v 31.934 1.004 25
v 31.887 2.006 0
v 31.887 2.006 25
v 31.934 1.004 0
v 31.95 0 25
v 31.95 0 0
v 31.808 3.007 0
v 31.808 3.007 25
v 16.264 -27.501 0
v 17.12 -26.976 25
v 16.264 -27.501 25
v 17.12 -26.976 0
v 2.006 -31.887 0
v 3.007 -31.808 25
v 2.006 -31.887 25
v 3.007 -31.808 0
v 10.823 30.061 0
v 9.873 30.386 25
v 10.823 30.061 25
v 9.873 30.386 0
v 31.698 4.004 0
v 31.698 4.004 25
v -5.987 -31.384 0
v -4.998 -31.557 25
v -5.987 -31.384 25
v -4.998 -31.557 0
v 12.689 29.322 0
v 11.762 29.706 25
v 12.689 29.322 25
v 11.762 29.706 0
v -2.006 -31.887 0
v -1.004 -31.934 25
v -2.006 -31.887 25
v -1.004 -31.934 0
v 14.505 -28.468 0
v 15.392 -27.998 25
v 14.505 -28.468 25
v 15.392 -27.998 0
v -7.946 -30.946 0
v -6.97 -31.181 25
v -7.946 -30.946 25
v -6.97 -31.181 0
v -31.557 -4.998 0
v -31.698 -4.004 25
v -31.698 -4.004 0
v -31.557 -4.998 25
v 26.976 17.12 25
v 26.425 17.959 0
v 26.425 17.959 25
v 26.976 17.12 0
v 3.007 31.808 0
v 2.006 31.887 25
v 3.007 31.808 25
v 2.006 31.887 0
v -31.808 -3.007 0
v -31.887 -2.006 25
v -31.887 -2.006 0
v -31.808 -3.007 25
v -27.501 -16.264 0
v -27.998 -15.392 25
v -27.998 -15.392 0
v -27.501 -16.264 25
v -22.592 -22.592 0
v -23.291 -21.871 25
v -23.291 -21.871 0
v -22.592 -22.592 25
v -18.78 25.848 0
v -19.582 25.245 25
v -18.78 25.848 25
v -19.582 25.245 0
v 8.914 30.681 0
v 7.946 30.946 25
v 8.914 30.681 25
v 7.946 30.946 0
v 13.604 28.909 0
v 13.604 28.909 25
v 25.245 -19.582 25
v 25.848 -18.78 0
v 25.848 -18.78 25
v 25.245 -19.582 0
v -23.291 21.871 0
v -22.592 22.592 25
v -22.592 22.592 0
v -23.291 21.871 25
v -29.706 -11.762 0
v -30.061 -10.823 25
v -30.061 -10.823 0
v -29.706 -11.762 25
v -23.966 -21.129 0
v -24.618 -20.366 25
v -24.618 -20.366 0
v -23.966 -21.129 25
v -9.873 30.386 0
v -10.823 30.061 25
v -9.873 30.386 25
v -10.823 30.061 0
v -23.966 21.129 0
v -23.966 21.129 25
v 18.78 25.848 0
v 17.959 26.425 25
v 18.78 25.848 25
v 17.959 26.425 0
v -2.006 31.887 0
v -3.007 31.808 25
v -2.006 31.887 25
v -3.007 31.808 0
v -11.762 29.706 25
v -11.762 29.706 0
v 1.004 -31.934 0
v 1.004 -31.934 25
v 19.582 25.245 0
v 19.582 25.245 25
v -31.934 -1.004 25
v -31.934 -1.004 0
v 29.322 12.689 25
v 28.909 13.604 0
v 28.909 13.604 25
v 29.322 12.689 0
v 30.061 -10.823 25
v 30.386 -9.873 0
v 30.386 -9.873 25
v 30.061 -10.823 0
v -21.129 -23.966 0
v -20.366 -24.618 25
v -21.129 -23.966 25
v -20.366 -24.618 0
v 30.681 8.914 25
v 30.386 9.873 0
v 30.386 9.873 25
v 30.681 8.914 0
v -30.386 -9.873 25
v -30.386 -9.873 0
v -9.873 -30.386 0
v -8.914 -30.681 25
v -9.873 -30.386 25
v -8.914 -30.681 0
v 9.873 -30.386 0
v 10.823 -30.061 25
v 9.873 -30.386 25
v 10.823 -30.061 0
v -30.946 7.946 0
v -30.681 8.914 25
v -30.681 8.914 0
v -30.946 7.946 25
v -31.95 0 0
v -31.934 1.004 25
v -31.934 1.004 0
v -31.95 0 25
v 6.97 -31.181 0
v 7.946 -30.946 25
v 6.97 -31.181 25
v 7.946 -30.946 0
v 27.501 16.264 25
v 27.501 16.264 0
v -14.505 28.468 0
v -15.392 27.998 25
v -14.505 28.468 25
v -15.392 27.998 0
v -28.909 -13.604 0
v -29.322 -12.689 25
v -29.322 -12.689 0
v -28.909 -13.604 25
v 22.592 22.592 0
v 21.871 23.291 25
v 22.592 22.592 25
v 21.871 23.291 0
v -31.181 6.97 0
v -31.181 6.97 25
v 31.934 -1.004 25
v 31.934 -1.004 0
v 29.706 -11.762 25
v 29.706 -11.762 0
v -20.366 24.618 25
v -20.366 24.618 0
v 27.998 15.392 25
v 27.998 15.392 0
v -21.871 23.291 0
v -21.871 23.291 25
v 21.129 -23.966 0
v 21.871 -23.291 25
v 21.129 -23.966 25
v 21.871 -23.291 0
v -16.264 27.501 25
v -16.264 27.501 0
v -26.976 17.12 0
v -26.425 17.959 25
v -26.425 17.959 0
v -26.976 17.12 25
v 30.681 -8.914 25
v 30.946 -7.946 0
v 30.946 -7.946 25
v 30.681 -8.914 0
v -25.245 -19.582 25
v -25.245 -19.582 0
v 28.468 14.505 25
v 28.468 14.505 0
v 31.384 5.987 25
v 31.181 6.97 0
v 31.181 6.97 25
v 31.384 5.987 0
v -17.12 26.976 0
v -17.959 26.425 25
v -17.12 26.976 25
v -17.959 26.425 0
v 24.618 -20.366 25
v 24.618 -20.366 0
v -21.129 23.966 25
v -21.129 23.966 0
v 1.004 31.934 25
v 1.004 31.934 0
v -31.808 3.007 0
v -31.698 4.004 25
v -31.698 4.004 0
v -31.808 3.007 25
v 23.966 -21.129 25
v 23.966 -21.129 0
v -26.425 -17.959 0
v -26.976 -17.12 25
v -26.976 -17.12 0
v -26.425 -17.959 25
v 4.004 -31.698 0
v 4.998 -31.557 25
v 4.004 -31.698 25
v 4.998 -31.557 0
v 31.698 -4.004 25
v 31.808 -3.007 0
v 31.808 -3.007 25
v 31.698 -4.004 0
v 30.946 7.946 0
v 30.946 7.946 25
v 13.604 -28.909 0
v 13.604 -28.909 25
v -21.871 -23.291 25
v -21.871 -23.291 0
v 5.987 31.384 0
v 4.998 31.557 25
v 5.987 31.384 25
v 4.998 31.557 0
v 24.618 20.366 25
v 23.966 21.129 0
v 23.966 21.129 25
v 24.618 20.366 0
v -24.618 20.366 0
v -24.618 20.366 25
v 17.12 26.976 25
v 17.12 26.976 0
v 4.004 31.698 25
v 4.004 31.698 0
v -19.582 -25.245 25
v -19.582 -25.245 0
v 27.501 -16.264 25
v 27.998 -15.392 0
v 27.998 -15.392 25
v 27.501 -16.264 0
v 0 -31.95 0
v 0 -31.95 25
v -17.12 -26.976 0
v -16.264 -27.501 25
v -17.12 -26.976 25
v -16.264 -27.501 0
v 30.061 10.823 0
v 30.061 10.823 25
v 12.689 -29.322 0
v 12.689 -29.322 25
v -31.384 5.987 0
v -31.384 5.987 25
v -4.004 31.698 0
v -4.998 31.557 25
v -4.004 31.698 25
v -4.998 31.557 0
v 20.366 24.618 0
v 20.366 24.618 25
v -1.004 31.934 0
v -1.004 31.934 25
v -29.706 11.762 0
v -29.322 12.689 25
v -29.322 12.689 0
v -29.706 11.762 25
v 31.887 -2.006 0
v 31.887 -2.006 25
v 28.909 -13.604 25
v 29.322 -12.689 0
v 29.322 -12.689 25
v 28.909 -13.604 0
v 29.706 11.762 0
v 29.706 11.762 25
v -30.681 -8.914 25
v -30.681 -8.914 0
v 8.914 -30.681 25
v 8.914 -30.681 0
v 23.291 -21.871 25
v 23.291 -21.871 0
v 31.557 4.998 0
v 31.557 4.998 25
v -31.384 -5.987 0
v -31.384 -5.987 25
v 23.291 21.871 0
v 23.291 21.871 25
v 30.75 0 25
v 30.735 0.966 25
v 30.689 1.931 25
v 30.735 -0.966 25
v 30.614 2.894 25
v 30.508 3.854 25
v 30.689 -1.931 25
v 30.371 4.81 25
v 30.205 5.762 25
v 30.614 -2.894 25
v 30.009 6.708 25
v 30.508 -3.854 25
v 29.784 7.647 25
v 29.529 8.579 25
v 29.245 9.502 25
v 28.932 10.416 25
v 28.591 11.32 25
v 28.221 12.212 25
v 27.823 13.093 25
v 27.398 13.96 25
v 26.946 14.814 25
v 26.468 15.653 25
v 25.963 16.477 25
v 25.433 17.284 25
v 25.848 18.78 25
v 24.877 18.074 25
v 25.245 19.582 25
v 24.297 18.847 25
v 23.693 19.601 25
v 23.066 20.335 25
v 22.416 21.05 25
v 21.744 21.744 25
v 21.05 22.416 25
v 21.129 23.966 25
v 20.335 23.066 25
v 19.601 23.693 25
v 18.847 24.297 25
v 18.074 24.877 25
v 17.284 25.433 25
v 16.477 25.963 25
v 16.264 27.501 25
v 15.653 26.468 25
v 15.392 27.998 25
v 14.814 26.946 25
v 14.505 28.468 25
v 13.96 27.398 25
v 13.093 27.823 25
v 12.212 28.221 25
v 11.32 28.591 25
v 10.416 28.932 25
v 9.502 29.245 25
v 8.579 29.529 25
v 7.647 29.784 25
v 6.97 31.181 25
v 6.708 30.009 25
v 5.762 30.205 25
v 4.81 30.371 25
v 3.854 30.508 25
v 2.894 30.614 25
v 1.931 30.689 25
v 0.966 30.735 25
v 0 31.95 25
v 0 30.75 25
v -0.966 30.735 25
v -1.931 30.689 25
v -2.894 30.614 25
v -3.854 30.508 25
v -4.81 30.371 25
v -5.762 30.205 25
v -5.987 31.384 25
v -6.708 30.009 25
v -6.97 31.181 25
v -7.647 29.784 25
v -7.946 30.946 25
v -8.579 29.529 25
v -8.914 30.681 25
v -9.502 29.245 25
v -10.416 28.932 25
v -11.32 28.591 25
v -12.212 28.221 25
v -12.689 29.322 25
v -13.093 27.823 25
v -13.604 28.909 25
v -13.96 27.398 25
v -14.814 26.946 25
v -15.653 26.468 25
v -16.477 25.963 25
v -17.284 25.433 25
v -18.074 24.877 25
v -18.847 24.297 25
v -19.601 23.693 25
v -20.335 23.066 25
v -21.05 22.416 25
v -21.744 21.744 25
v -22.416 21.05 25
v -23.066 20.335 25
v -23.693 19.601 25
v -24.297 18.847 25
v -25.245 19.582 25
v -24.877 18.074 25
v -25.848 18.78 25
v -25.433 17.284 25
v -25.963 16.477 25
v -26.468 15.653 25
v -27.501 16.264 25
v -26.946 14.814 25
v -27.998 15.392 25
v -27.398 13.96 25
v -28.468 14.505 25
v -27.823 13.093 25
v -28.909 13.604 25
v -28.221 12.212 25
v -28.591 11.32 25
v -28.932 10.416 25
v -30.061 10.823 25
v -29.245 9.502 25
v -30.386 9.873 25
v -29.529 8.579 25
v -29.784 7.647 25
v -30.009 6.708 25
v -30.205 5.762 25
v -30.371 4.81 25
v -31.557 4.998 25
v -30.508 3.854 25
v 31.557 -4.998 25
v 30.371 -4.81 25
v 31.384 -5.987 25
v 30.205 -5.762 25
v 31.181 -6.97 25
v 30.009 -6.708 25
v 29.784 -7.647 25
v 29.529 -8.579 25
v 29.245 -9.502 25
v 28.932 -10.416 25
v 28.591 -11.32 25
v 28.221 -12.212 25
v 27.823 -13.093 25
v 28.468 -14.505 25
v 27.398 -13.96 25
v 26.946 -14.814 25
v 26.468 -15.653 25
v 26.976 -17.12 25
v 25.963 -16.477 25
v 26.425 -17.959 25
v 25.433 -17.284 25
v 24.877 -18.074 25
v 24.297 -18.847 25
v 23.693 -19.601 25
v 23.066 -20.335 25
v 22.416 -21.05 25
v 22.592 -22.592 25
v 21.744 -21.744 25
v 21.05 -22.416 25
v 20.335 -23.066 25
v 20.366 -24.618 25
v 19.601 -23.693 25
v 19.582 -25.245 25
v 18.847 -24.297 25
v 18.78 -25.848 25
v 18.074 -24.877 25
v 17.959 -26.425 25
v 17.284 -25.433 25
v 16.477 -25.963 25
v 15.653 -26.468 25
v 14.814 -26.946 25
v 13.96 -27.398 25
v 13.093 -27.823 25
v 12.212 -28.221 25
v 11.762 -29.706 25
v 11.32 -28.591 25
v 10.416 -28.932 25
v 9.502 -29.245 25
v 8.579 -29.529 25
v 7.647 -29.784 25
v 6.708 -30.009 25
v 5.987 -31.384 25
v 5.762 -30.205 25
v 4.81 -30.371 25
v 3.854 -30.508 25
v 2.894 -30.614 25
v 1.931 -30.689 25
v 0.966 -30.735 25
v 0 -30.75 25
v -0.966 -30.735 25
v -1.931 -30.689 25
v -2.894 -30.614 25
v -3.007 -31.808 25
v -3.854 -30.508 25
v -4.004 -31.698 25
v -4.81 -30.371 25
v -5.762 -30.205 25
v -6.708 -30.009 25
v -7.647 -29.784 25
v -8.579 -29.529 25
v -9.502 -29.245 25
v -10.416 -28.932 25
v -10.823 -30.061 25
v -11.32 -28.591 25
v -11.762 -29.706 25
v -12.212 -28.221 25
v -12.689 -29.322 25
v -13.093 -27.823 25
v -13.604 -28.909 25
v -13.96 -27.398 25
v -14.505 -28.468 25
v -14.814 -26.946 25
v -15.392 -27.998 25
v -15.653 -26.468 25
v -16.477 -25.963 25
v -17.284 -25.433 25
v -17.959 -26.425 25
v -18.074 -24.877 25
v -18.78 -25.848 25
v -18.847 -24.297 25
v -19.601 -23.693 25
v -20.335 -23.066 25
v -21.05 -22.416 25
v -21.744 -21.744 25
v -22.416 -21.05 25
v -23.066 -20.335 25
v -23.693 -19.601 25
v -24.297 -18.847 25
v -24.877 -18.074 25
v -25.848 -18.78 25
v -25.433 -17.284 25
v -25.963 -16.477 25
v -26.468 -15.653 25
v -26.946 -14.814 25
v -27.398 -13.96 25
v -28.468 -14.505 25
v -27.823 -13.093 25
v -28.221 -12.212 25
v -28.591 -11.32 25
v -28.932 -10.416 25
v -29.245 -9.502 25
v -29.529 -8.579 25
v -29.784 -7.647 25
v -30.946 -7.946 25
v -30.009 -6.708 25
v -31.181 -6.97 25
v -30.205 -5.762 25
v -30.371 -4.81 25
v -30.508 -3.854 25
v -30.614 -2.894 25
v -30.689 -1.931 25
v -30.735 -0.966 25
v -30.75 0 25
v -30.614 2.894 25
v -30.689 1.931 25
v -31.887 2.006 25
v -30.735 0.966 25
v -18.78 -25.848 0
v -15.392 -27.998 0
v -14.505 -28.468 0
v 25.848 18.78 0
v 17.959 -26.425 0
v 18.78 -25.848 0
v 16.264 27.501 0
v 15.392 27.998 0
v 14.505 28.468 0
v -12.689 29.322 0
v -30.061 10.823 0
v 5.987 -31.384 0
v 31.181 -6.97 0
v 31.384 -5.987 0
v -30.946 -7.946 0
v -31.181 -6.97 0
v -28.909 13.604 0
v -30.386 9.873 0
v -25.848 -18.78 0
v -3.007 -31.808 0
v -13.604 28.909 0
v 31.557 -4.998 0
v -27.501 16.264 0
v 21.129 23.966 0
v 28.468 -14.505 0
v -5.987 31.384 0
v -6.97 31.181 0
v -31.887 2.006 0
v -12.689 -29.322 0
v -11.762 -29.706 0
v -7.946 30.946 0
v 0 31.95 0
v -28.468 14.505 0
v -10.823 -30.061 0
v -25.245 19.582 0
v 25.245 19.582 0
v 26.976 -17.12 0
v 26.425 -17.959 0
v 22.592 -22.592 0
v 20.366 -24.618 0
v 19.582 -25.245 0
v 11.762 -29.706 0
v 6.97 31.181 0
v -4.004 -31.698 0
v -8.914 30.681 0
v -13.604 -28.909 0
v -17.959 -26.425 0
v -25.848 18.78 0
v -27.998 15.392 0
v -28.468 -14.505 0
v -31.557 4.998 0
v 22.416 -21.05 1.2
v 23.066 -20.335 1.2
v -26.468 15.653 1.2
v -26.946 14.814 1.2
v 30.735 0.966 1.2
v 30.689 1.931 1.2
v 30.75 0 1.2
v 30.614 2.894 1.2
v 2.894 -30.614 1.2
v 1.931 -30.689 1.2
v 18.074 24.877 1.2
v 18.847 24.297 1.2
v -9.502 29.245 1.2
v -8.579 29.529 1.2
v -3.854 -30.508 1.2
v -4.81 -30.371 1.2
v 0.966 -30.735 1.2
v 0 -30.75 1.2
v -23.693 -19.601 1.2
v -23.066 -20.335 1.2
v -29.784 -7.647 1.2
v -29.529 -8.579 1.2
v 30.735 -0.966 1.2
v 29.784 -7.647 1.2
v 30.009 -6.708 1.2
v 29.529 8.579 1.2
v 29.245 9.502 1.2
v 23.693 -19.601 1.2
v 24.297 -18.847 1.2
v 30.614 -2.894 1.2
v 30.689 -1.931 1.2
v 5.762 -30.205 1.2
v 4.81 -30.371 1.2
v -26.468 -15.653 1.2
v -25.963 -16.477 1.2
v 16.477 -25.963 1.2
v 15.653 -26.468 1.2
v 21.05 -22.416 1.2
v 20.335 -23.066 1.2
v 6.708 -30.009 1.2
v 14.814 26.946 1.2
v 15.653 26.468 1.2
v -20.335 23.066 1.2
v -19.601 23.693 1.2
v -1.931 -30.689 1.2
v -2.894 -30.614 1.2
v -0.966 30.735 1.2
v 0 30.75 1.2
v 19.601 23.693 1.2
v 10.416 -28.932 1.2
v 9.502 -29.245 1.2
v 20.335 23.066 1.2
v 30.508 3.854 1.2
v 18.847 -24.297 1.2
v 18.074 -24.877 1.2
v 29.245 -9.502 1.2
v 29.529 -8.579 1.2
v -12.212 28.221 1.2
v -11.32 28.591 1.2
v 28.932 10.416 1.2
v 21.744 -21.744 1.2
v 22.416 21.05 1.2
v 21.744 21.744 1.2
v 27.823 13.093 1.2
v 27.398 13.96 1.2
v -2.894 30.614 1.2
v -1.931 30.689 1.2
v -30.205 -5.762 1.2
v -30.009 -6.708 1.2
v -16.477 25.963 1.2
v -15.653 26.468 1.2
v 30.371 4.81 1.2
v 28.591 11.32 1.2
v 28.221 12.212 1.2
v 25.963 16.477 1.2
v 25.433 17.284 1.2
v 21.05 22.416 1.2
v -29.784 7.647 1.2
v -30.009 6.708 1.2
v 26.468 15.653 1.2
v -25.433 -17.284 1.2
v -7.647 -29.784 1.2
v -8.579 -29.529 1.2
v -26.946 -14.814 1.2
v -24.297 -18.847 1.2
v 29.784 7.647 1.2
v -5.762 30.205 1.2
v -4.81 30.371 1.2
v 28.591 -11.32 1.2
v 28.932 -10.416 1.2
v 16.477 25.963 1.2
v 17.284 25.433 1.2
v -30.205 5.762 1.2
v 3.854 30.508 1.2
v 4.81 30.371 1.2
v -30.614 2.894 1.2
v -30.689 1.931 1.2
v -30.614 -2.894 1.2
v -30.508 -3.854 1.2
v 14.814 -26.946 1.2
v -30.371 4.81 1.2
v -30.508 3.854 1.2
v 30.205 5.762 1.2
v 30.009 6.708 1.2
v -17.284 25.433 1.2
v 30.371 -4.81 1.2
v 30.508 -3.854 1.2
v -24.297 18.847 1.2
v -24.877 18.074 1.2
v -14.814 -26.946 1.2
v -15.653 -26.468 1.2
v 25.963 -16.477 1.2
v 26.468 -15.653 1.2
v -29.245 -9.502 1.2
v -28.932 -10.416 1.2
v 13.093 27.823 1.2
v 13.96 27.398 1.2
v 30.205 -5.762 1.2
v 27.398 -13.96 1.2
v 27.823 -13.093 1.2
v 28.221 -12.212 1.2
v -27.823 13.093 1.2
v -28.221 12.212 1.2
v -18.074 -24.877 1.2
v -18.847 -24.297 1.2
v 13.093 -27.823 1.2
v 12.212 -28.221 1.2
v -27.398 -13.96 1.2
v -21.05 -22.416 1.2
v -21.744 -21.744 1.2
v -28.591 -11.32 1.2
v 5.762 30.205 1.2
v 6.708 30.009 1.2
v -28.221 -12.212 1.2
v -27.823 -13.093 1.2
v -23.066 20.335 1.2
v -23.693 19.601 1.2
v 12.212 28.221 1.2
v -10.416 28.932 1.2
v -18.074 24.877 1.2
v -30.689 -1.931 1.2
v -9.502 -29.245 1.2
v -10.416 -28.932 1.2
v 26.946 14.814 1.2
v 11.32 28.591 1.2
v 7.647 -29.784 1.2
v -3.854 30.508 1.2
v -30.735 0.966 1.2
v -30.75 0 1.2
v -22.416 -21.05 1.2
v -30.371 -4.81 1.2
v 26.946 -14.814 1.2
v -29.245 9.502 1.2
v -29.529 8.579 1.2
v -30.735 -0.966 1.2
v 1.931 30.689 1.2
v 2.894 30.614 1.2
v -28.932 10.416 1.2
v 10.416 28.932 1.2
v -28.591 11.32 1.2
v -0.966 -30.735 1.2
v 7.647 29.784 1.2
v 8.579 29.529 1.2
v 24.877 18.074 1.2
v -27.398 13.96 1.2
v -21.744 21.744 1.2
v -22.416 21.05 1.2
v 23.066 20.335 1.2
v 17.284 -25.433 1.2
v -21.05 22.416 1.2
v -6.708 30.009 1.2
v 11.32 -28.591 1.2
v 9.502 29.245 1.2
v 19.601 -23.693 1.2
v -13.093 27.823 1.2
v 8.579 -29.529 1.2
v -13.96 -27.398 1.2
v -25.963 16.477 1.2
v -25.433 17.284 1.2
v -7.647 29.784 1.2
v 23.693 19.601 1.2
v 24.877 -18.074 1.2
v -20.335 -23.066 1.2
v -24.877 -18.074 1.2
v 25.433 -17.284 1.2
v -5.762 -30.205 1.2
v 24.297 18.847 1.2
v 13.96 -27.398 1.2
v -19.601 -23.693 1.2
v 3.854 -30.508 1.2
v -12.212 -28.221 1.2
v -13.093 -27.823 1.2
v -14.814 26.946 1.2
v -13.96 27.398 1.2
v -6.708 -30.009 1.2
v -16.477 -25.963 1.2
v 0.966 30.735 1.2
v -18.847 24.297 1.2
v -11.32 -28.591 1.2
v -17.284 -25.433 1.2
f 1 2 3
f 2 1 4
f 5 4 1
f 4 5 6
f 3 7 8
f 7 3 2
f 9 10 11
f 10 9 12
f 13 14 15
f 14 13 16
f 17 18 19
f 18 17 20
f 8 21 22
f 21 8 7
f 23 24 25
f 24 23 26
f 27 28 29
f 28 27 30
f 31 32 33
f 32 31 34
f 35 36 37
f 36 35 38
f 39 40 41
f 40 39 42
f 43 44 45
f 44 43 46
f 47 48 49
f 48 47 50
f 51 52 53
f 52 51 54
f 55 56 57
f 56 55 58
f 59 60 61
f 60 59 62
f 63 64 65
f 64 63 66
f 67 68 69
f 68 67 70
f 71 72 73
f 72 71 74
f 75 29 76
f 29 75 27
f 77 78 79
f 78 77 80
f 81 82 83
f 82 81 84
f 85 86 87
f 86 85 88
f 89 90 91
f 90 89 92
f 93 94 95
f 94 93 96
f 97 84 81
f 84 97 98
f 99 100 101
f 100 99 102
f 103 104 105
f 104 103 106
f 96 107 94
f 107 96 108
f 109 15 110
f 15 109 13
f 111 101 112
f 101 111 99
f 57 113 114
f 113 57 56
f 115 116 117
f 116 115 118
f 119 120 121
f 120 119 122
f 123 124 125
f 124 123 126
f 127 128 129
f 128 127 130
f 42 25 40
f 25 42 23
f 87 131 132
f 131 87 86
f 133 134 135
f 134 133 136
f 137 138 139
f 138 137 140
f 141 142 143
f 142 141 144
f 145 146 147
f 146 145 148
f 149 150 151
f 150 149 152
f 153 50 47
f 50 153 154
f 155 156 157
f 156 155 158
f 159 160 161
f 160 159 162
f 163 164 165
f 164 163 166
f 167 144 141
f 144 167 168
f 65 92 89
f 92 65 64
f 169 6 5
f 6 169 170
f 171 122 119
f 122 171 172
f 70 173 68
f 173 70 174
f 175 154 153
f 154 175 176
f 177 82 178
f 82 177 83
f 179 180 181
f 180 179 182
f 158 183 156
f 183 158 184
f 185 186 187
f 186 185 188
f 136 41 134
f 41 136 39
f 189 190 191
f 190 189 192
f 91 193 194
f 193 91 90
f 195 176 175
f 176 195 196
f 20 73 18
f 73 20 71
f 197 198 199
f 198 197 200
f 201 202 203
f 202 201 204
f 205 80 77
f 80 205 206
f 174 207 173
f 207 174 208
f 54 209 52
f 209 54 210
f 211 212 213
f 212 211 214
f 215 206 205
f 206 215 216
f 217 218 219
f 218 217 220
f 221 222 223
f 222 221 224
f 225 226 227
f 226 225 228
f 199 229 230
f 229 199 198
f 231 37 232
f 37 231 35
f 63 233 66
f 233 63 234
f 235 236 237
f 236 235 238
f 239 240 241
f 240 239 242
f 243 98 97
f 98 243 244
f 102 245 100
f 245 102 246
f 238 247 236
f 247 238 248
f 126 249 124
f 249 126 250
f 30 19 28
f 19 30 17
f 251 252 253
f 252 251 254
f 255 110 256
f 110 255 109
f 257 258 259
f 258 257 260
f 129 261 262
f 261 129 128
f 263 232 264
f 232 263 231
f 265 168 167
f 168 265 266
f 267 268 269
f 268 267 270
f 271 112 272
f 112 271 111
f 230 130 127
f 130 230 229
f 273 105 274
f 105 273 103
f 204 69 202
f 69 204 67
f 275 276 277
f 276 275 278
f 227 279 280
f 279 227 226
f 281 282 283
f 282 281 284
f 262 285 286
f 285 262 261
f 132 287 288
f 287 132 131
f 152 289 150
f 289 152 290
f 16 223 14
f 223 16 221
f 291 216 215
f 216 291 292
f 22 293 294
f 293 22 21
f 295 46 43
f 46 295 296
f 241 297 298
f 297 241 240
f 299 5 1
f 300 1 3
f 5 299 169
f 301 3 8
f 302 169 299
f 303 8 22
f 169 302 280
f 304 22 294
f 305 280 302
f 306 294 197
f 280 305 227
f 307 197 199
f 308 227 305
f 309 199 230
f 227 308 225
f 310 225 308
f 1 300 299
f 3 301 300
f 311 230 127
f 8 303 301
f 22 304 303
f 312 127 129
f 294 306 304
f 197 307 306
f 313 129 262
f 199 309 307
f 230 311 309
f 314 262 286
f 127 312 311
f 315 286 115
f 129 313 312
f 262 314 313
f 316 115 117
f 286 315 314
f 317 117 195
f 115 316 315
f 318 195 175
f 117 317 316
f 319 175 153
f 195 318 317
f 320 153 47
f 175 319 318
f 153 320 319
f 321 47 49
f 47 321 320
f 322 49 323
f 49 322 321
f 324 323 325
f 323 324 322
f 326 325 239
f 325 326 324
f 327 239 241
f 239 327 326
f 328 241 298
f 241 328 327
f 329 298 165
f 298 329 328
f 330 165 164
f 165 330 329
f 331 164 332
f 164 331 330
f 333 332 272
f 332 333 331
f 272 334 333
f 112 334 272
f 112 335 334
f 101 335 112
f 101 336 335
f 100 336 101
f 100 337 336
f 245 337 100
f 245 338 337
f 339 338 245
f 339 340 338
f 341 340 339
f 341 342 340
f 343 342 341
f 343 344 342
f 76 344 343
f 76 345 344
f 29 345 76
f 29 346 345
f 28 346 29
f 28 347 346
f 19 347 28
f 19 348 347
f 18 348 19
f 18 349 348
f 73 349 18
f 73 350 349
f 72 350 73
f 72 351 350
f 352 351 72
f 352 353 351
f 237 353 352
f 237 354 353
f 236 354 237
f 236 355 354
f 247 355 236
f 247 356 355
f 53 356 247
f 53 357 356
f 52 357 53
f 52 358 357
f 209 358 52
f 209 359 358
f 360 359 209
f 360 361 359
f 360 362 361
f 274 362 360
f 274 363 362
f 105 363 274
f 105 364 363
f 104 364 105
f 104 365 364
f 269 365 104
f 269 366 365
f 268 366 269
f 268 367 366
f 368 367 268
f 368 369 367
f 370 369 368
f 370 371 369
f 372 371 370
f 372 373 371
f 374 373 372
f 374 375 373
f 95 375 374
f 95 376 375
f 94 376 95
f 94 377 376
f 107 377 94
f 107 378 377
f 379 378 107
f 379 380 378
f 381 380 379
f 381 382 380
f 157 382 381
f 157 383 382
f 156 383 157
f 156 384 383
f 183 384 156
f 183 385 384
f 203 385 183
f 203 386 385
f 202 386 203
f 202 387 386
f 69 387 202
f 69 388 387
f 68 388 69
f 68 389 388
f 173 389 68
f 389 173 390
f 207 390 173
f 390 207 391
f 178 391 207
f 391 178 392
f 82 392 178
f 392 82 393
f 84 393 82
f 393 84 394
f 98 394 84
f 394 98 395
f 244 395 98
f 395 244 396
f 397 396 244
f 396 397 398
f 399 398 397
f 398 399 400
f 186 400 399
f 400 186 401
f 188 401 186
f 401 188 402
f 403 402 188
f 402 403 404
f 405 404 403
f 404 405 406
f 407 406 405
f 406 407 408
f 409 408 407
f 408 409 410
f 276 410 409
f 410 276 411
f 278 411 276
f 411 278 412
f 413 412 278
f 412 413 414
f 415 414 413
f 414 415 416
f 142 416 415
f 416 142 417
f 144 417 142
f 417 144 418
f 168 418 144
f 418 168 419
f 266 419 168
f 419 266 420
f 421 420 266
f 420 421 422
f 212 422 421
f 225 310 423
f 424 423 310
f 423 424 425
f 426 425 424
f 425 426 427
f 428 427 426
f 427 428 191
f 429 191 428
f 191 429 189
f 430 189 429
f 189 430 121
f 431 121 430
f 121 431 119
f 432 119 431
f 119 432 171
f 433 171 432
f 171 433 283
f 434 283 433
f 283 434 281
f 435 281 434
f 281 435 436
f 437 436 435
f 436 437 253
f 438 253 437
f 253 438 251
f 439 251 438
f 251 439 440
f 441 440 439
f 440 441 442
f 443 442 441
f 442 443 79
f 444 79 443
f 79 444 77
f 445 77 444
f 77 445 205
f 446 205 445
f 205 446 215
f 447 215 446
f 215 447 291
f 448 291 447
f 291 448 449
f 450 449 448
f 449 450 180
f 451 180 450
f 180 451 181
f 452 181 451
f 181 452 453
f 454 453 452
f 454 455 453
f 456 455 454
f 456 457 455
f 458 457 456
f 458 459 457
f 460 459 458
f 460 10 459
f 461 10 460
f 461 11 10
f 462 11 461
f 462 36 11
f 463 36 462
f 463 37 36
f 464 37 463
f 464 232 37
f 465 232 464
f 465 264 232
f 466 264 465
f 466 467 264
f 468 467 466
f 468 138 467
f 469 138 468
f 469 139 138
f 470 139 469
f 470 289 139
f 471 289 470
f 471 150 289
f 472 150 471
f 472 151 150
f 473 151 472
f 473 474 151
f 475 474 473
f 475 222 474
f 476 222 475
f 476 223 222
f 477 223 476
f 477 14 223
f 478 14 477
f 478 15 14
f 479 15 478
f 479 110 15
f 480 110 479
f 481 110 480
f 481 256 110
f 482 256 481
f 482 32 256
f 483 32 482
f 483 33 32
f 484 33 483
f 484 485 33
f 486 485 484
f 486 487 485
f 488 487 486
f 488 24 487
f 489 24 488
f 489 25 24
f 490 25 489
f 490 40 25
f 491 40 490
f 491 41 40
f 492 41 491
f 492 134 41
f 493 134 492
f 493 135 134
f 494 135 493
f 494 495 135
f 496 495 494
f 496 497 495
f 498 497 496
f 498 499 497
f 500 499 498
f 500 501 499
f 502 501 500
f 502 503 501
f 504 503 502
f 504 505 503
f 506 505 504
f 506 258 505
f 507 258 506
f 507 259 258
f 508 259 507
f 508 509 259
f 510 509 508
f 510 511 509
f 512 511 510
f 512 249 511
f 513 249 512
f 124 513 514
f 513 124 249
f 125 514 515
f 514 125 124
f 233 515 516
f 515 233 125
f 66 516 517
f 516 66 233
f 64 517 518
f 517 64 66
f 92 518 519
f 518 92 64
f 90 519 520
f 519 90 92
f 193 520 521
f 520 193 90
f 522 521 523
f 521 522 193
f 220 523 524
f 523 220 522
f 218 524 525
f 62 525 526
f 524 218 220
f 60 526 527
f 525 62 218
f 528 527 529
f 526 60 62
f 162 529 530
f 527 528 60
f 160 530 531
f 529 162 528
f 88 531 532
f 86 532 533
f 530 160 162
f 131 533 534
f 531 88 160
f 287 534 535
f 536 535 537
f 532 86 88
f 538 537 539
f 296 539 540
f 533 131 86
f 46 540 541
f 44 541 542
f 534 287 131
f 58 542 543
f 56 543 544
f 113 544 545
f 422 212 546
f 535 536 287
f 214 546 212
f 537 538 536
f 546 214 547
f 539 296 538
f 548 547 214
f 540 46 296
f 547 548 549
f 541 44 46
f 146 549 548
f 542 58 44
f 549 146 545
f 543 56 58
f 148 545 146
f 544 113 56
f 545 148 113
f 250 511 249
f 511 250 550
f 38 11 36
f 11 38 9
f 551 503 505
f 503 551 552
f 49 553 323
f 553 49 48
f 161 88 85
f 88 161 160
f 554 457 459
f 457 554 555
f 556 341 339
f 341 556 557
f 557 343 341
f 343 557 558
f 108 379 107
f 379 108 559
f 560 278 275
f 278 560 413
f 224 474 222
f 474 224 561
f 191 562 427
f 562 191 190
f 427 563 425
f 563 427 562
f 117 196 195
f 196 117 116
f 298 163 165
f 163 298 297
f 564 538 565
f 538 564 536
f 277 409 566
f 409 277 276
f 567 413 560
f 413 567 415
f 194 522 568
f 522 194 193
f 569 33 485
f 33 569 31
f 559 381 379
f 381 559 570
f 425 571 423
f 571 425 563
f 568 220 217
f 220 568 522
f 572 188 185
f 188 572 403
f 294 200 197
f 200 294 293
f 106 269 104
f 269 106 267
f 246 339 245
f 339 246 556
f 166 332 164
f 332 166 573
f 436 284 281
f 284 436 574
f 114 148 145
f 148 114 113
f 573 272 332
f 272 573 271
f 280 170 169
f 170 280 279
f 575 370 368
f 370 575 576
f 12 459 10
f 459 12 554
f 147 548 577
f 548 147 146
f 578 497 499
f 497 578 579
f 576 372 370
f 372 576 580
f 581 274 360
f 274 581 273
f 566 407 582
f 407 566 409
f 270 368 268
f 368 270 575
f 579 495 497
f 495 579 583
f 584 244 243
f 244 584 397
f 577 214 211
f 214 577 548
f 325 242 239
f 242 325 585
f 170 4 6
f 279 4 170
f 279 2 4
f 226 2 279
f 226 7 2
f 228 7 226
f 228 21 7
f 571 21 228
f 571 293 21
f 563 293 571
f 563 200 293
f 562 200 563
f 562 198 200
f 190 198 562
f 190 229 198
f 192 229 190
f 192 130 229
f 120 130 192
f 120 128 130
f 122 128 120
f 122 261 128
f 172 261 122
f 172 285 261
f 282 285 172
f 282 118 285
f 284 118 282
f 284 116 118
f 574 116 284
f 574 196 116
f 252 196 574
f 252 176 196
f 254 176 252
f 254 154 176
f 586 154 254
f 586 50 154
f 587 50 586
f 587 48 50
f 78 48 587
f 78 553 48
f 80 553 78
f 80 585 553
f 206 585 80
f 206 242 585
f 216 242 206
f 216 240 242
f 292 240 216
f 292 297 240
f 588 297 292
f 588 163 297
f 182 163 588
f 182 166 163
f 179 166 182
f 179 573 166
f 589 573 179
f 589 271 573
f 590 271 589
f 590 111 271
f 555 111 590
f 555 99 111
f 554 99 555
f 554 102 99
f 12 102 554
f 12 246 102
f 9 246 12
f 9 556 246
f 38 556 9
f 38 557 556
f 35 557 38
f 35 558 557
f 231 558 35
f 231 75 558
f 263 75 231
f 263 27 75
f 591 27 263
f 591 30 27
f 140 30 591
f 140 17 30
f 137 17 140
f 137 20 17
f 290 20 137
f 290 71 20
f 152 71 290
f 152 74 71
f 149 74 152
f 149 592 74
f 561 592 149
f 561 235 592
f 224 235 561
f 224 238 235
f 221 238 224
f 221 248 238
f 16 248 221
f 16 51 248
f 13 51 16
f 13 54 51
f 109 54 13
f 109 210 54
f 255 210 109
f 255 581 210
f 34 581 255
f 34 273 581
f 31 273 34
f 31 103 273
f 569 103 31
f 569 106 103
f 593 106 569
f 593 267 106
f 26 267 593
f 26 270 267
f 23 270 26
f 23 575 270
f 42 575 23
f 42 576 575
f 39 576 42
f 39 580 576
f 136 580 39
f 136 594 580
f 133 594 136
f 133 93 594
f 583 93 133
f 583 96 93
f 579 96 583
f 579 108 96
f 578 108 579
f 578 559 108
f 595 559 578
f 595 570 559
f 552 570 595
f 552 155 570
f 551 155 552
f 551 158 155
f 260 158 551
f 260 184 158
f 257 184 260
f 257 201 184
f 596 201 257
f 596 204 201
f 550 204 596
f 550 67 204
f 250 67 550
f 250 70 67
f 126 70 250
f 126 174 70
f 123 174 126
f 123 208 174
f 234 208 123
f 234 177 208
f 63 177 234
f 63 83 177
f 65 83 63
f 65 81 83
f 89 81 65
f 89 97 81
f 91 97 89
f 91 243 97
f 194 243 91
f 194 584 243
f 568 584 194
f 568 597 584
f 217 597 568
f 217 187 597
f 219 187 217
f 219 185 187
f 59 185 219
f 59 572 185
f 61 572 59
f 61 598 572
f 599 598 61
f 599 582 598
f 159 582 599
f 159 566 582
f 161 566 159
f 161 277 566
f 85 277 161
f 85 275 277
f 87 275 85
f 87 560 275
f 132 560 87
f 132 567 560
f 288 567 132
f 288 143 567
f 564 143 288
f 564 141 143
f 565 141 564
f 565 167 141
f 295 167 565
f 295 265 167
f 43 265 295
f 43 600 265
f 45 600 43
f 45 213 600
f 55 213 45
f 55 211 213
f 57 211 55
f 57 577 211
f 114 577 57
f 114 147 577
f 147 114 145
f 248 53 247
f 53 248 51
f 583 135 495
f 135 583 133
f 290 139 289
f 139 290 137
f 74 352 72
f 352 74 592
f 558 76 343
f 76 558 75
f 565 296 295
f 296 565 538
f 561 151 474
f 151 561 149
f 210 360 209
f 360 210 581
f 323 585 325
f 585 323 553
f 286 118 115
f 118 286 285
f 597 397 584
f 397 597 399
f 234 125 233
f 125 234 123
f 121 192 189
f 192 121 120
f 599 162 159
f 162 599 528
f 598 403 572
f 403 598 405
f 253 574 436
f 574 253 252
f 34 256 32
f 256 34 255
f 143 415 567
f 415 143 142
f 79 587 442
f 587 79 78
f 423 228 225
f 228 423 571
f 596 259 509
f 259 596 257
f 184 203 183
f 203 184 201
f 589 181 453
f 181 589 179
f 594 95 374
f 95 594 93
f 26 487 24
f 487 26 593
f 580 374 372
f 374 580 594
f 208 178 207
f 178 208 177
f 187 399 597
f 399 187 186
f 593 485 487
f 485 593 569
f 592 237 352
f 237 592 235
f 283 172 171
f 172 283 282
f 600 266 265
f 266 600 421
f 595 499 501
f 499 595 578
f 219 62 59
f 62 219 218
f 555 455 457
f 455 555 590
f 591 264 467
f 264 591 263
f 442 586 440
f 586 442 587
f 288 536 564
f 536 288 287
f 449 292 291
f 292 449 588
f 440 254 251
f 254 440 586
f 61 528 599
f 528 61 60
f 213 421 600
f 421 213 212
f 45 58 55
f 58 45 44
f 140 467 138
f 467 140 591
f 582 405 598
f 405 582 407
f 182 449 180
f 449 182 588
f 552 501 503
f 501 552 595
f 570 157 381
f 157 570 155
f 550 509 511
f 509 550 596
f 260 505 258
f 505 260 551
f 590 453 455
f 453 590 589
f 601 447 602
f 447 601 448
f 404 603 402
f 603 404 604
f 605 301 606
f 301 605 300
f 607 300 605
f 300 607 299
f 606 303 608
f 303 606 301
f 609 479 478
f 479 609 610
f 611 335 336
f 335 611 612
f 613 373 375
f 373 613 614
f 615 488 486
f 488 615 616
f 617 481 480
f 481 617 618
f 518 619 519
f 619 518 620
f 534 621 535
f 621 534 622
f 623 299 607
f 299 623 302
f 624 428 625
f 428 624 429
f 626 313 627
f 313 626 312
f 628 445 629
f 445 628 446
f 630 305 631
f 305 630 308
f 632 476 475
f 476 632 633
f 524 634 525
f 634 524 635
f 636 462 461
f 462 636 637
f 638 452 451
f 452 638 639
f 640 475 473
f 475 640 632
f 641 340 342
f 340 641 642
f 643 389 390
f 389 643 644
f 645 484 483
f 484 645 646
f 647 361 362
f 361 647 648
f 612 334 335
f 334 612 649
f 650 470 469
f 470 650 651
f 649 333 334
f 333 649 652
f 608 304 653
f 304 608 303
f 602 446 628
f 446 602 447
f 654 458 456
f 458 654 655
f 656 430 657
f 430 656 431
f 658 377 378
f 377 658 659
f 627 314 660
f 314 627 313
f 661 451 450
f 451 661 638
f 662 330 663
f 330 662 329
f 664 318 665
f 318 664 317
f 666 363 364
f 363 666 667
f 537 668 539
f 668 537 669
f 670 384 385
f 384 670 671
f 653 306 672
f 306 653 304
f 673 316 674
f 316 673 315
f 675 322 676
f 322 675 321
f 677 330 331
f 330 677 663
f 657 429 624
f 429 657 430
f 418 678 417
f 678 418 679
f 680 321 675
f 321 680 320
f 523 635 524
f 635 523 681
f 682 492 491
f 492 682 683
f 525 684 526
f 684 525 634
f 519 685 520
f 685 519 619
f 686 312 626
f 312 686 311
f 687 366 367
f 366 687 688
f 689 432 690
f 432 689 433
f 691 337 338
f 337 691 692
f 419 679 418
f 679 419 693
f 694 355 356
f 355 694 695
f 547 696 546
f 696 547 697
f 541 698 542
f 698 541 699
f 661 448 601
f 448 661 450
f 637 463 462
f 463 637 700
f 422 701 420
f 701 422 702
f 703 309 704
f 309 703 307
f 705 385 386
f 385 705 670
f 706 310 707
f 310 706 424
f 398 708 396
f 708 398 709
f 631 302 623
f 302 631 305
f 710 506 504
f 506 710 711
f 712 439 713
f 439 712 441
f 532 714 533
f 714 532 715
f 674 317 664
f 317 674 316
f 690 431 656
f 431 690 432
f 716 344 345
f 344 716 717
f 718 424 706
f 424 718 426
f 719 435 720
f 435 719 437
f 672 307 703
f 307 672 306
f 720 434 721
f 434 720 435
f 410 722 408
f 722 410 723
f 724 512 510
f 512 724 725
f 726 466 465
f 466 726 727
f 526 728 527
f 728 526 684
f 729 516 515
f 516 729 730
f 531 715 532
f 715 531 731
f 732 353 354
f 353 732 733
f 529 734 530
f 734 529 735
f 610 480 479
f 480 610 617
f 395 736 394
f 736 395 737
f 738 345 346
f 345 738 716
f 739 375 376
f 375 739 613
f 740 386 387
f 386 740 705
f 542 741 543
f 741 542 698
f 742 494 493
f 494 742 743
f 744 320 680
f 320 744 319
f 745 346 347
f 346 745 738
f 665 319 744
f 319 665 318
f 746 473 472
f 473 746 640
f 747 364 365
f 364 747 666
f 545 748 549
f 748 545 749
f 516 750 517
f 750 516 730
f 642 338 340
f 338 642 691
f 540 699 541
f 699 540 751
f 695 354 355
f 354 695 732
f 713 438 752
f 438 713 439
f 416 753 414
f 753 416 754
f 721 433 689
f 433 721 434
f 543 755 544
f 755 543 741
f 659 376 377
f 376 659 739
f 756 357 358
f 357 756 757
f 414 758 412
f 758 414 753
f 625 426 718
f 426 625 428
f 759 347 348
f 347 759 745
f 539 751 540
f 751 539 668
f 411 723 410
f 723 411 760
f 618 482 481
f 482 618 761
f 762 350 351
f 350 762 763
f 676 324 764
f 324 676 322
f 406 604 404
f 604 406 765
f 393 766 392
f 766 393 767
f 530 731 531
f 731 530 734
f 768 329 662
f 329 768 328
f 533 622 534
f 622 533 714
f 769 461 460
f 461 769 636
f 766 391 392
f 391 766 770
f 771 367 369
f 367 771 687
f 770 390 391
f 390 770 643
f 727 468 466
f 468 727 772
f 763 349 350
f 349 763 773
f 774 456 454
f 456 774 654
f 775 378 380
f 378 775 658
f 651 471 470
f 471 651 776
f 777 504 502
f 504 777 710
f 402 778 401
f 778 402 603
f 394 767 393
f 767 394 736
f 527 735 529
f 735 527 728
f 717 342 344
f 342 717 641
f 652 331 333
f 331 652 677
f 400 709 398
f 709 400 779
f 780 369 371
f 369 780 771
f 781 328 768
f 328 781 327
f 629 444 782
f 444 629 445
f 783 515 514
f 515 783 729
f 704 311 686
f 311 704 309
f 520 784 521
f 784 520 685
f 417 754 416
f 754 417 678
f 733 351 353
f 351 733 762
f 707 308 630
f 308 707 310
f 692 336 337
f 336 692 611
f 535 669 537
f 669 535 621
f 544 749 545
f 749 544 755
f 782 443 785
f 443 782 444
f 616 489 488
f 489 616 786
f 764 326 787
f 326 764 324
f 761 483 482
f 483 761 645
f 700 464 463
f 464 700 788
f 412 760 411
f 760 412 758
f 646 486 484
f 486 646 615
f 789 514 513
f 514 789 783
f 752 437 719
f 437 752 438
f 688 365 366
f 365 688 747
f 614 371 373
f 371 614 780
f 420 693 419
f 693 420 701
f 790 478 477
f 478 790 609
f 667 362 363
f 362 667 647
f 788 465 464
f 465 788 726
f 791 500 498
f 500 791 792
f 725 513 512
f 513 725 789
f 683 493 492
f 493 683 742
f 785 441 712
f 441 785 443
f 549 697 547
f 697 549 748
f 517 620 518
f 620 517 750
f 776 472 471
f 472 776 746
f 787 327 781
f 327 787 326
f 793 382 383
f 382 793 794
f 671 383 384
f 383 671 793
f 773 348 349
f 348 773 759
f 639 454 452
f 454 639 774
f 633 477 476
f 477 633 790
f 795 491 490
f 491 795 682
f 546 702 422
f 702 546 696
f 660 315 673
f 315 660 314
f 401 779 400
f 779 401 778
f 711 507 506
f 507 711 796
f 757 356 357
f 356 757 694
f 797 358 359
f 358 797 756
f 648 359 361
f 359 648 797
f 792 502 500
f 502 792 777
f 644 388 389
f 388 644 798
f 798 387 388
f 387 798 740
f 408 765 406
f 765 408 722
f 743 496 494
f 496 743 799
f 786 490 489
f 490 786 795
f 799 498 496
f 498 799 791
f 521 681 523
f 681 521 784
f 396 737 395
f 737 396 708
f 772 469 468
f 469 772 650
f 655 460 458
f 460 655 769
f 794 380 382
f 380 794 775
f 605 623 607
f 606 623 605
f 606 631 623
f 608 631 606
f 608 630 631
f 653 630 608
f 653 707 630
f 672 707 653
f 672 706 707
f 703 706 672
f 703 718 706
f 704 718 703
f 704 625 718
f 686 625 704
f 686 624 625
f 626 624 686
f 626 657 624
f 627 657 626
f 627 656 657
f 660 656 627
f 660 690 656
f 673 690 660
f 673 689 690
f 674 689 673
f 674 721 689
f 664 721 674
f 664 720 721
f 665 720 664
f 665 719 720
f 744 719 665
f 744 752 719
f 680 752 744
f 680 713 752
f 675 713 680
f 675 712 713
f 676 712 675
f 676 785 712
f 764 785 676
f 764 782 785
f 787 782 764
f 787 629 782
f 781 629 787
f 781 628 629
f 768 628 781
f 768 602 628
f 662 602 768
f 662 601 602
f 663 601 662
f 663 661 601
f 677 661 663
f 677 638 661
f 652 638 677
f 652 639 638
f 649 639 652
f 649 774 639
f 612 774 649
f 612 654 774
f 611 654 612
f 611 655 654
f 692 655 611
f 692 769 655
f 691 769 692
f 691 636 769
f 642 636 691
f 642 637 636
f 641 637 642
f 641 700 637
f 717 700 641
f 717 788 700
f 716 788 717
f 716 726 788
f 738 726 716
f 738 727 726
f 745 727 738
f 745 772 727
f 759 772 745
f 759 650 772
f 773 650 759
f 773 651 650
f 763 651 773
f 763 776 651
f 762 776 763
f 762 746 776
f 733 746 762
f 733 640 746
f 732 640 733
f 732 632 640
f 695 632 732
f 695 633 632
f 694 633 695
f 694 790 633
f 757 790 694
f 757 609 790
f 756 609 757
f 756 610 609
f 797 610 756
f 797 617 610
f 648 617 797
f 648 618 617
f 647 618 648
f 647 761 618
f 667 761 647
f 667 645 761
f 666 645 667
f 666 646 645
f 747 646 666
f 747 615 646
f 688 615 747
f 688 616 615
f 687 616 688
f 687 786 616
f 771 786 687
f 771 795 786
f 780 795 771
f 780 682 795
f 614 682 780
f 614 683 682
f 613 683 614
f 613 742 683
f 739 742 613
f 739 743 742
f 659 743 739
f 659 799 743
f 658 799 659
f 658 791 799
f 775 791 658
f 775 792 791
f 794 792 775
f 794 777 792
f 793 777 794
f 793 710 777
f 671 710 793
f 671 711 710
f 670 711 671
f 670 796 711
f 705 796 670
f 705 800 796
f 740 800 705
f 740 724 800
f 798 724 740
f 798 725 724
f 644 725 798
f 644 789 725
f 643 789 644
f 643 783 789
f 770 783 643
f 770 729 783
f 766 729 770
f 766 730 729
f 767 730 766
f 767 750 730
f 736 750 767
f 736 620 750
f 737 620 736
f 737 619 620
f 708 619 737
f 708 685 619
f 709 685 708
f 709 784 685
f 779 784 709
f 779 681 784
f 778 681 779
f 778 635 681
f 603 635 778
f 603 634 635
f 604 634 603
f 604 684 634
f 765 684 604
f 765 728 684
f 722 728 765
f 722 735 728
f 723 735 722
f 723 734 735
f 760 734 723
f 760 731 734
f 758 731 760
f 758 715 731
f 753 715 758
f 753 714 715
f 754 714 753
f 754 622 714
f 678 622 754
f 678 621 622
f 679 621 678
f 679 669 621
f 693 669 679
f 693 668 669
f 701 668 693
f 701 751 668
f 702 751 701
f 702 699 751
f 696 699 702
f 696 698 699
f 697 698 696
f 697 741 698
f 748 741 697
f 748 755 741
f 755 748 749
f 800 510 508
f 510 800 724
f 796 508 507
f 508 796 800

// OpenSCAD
// Fitting Cap
 
$fn = 200;
 
// Parameters
inner_radius = 30.75;
wall_thickness = 1.2;
outer_radius = inner_radius + wall_thickness;
height = 25;
 
difference() {
    // This piece will be created:
    cylinder(r=outer_radius, h=height, center=false);
 
    // Everything else listed will be taken away:
    translate([0,0,1.2])cylinder(r=inner_radius, h=height, center=false);
}


    
